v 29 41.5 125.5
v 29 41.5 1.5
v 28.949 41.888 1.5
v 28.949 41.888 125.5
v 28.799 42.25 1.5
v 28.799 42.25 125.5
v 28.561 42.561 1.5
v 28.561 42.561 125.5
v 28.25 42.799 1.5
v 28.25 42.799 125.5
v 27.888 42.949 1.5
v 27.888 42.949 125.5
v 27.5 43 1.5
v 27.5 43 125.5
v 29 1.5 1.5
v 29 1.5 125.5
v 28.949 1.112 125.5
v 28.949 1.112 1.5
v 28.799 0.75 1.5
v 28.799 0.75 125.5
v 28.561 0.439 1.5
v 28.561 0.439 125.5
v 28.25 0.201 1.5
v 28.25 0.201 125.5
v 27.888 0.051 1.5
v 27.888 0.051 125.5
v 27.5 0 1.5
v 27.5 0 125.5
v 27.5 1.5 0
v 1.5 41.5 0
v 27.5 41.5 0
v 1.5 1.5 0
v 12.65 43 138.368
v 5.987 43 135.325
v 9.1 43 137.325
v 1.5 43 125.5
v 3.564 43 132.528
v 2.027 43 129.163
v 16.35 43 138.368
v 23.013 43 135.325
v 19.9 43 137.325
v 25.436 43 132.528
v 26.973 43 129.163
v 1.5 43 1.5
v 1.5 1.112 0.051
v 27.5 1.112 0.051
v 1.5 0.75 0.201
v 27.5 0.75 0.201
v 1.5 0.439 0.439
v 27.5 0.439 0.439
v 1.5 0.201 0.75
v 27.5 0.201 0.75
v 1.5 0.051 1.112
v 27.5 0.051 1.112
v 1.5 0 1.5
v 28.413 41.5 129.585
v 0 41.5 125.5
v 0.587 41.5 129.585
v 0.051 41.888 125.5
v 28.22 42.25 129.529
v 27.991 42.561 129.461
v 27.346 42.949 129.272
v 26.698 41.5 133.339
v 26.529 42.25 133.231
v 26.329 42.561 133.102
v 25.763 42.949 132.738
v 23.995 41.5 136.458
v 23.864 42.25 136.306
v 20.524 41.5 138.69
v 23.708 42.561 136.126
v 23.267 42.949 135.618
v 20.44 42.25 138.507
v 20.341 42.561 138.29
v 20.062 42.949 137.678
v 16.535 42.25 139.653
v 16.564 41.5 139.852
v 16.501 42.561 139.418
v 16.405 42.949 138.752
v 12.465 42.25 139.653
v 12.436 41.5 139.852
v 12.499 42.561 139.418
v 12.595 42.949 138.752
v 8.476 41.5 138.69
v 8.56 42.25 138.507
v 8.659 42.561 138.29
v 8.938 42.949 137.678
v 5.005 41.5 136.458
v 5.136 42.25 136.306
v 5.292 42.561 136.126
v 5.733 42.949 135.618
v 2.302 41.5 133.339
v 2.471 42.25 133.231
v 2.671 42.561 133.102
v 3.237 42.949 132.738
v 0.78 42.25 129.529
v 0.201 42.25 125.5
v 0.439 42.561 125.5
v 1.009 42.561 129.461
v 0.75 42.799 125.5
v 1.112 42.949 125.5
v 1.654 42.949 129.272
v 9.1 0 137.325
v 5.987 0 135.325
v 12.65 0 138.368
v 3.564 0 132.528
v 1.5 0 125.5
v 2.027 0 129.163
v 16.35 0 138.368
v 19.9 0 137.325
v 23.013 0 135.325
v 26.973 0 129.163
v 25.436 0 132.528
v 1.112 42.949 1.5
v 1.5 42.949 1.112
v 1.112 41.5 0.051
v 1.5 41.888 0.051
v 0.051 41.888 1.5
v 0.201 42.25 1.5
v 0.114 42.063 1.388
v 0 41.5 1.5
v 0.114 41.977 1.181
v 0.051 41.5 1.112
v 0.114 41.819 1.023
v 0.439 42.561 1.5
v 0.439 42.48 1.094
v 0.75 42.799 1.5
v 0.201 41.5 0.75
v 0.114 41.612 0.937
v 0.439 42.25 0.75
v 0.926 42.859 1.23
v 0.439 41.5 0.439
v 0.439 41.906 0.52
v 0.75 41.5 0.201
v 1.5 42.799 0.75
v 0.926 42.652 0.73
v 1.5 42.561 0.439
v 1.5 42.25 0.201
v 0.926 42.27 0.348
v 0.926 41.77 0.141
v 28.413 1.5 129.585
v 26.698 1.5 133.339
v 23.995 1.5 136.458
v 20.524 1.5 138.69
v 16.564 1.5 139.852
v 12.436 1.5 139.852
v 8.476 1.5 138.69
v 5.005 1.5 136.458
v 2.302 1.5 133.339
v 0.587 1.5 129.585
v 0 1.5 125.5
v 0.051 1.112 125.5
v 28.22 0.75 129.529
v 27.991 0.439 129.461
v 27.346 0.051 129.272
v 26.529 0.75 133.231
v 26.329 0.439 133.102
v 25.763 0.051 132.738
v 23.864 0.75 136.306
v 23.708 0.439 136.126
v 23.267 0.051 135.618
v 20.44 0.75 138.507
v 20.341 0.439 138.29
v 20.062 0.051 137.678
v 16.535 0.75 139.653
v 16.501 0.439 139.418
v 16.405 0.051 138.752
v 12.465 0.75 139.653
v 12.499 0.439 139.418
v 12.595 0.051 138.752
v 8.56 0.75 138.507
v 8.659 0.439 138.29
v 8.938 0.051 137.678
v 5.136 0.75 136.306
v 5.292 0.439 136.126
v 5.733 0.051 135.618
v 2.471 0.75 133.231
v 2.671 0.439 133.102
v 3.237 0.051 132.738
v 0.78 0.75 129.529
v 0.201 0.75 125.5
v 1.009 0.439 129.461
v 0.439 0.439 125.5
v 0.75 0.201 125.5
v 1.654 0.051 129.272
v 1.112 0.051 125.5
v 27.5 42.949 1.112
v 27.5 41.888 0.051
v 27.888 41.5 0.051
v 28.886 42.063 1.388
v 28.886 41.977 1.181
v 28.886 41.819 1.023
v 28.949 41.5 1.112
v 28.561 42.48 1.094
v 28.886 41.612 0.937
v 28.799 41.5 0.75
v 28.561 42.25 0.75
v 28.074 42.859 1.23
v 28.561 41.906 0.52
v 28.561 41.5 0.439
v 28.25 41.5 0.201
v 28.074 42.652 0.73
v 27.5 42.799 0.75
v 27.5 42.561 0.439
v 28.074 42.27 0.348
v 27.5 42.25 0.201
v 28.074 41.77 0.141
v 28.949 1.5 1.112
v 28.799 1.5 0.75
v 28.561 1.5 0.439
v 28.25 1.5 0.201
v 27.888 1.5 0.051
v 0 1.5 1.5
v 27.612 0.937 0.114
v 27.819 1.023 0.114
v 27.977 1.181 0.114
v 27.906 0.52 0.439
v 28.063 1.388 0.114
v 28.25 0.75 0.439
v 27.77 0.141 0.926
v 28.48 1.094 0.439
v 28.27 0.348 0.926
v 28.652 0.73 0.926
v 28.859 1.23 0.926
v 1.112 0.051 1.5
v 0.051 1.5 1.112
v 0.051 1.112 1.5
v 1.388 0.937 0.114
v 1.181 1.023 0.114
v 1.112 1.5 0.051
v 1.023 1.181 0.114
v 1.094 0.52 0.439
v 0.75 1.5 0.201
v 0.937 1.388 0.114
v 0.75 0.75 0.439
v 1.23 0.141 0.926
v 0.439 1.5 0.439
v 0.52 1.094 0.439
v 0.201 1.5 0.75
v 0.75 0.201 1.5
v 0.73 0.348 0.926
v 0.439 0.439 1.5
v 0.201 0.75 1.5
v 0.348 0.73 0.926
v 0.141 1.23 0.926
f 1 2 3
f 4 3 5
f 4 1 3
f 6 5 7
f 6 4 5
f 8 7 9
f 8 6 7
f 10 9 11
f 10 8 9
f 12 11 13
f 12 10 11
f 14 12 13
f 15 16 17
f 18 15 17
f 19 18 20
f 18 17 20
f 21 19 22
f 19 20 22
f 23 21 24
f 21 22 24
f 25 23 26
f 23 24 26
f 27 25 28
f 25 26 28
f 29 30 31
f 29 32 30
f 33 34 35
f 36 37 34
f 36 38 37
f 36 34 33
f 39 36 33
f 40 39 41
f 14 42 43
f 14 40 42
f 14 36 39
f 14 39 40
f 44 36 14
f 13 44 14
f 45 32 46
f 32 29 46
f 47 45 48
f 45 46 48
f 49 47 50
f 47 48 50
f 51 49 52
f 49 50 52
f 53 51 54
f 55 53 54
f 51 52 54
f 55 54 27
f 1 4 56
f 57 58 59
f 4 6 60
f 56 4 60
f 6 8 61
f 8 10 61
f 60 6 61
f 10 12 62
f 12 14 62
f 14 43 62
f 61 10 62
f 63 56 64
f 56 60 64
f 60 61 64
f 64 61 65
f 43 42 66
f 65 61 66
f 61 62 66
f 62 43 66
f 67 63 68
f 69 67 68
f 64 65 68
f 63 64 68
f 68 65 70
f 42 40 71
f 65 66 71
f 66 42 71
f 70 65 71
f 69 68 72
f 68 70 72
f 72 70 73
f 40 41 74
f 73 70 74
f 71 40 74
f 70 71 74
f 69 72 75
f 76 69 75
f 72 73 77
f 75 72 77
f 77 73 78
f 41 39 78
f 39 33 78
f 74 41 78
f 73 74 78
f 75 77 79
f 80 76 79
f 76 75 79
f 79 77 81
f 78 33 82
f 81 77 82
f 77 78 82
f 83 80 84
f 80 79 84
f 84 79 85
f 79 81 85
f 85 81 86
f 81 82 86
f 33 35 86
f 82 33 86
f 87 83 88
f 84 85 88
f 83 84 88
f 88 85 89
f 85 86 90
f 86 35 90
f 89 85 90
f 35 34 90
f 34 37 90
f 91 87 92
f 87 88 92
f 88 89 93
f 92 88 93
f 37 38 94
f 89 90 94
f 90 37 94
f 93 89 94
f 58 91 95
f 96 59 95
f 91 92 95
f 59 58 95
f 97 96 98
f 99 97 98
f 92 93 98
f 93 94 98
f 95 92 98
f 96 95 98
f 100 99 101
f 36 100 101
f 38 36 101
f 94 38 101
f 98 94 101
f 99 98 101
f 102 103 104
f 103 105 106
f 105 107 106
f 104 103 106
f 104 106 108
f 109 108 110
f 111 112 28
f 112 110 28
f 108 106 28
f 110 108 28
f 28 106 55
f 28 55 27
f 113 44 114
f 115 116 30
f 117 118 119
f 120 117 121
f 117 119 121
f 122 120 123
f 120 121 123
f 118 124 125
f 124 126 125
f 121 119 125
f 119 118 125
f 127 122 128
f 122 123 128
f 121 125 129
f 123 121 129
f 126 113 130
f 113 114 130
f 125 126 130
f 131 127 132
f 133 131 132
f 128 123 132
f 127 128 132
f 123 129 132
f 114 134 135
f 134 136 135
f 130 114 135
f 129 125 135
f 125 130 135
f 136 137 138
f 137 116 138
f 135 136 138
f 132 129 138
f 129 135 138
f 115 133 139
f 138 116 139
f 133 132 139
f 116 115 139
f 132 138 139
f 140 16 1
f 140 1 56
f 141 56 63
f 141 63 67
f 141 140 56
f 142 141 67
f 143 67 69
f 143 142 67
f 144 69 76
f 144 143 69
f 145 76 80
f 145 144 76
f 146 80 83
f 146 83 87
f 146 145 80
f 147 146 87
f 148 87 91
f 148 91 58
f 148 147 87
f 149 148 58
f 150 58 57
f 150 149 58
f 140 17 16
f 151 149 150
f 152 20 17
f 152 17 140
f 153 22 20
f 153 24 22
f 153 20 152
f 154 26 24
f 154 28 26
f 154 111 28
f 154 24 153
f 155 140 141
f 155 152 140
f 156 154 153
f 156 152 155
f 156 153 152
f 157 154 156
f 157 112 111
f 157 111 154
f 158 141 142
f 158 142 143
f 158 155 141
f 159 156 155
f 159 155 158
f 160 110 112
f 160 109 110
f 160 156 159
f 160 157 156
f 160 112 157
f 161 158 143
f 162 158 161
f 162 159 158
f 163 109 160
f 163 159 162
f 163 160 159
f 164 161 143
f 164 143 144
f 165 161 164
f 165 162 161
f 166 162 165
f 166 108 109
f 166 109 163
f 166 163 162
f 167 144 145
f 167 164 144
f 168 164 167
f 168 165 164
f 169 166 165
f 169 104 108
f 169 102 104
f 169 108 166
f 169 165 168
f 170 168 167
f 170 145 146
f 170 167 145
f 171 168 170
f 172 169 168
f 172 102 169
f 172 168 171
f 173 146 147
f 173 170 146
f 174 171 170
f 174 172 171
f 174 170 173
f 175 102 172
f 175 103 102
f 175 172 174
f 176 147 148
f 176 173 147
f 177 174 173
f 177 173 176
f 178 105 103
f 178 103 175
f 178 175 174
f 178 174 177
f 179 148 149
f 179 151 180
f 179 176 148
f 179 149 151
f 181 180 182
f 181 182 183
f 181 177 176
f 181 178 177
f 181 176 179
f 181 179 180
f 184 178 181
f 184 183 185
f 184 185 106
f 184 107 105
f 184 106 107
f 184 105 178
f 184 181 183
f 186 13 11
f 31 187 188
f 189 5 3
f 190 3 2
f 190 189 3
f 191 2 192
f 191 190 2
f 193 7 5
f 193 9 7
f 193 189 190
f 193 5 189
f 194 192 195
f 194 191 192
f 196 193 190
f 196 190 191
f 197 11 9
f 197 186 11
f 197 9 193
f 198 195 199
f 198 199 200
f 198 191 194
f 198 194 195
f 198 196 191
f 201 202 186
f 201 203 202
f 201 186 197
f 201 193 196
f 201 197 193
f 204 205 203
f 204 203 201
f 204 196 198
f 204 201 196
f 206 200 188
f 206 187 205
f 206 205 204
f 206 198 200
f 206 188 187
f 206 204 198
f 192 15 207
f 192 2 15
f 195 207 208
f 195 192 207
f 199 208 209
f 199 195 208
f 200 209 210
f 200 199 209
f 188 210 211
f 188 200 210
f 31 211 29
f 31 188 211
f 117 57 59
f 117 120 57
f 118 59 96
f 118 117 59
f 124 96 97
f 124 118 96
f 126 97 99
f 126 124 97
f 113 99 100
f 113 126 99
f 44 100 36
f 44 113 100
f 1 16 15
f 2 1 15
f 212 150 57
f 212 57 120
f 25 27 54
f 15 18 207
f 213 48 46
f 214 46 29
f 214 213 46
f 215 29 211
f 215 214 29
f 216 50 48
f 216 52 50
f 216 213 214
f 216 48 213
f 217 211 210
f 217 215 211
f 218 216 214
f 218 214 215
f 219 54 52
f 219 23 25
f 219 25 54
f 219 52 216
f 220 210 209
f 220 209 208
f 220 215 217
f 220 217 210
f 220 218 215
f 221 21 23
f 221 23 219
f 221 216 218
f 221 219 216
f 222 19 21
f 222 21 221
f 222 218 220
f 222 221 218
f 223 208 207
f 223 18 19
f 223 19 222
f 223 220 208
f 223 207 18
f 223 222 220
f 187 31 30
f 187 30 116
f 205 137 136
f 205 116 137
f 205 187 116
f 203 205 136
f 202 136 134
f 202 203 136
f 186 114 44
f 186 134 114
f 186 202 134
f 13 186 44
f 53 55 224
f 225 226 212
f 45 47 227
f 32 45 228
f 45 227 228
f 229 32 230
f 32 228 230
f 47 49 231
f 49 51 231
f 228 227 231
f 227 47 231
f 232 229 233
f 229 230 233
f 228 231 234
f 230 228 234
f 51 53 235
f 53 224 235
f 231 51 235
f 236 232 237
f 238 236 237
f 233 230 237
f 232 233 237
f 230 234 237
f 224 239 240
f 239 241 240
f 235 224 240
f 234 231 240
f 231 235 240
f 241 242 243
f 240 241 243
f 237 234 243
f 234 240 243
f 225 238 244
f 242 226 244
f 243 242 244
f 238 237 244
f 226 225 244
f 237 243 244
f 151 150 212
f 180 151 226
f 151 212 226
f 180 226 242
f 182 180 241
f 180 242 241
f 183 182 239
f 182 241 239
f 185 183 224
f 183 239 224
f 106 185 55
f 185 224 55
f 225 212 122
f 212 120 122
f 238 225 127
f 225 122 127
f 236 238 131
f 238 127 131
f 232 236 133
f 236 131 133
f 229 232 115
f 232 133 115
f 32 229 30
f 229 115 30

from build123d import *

# Parameters (mm, degrees)
SKETCH1_W           = 29
SKETCH1_H           = 125.5
BOSS_EXTRUDE1_DEPTH = 43
FILLET1_R           = 1.5


with BuildPart() as part:
    # Sketch1 → Boss-Extrude1 (new body)
    with BuildSketch(Plane(origin=(0, 0, 0), x_dir=(1, 0, 0), z_dir=(0, 1, 0))):
        with Locations((14.5, -62.75)):
            Rectangle(SKETCH1_W, SKETCH1_H)
        with BuildLine():
            Line((0, -125.5), (29, -125.5))
            ThreePointArc((29, -125.5), (14.5, -140), (0, -125.5))
        make_face()
    extrude(amount=BOSS_EXTRUDE1_DEPTH)

    # Fillet1
    fillet1_edges = [part.edges().sort_by_distance(p)[0] for p in [
        (14.5, 43, 0),
        (0, 43, 62.75),
        (14.5, 43, 140),
        (29, 43, 62.75),
        (14.5, 0, 140),
        (0, 0, 62.75),
        (14.5, 0, 0),
        (29, 0, 62.75),
        (0, 21.5, 0),
        (29, 21.5, 0),
    ]]
    fillet(fillet1_edges, radius=FILLET1_R)


solid = part.part
